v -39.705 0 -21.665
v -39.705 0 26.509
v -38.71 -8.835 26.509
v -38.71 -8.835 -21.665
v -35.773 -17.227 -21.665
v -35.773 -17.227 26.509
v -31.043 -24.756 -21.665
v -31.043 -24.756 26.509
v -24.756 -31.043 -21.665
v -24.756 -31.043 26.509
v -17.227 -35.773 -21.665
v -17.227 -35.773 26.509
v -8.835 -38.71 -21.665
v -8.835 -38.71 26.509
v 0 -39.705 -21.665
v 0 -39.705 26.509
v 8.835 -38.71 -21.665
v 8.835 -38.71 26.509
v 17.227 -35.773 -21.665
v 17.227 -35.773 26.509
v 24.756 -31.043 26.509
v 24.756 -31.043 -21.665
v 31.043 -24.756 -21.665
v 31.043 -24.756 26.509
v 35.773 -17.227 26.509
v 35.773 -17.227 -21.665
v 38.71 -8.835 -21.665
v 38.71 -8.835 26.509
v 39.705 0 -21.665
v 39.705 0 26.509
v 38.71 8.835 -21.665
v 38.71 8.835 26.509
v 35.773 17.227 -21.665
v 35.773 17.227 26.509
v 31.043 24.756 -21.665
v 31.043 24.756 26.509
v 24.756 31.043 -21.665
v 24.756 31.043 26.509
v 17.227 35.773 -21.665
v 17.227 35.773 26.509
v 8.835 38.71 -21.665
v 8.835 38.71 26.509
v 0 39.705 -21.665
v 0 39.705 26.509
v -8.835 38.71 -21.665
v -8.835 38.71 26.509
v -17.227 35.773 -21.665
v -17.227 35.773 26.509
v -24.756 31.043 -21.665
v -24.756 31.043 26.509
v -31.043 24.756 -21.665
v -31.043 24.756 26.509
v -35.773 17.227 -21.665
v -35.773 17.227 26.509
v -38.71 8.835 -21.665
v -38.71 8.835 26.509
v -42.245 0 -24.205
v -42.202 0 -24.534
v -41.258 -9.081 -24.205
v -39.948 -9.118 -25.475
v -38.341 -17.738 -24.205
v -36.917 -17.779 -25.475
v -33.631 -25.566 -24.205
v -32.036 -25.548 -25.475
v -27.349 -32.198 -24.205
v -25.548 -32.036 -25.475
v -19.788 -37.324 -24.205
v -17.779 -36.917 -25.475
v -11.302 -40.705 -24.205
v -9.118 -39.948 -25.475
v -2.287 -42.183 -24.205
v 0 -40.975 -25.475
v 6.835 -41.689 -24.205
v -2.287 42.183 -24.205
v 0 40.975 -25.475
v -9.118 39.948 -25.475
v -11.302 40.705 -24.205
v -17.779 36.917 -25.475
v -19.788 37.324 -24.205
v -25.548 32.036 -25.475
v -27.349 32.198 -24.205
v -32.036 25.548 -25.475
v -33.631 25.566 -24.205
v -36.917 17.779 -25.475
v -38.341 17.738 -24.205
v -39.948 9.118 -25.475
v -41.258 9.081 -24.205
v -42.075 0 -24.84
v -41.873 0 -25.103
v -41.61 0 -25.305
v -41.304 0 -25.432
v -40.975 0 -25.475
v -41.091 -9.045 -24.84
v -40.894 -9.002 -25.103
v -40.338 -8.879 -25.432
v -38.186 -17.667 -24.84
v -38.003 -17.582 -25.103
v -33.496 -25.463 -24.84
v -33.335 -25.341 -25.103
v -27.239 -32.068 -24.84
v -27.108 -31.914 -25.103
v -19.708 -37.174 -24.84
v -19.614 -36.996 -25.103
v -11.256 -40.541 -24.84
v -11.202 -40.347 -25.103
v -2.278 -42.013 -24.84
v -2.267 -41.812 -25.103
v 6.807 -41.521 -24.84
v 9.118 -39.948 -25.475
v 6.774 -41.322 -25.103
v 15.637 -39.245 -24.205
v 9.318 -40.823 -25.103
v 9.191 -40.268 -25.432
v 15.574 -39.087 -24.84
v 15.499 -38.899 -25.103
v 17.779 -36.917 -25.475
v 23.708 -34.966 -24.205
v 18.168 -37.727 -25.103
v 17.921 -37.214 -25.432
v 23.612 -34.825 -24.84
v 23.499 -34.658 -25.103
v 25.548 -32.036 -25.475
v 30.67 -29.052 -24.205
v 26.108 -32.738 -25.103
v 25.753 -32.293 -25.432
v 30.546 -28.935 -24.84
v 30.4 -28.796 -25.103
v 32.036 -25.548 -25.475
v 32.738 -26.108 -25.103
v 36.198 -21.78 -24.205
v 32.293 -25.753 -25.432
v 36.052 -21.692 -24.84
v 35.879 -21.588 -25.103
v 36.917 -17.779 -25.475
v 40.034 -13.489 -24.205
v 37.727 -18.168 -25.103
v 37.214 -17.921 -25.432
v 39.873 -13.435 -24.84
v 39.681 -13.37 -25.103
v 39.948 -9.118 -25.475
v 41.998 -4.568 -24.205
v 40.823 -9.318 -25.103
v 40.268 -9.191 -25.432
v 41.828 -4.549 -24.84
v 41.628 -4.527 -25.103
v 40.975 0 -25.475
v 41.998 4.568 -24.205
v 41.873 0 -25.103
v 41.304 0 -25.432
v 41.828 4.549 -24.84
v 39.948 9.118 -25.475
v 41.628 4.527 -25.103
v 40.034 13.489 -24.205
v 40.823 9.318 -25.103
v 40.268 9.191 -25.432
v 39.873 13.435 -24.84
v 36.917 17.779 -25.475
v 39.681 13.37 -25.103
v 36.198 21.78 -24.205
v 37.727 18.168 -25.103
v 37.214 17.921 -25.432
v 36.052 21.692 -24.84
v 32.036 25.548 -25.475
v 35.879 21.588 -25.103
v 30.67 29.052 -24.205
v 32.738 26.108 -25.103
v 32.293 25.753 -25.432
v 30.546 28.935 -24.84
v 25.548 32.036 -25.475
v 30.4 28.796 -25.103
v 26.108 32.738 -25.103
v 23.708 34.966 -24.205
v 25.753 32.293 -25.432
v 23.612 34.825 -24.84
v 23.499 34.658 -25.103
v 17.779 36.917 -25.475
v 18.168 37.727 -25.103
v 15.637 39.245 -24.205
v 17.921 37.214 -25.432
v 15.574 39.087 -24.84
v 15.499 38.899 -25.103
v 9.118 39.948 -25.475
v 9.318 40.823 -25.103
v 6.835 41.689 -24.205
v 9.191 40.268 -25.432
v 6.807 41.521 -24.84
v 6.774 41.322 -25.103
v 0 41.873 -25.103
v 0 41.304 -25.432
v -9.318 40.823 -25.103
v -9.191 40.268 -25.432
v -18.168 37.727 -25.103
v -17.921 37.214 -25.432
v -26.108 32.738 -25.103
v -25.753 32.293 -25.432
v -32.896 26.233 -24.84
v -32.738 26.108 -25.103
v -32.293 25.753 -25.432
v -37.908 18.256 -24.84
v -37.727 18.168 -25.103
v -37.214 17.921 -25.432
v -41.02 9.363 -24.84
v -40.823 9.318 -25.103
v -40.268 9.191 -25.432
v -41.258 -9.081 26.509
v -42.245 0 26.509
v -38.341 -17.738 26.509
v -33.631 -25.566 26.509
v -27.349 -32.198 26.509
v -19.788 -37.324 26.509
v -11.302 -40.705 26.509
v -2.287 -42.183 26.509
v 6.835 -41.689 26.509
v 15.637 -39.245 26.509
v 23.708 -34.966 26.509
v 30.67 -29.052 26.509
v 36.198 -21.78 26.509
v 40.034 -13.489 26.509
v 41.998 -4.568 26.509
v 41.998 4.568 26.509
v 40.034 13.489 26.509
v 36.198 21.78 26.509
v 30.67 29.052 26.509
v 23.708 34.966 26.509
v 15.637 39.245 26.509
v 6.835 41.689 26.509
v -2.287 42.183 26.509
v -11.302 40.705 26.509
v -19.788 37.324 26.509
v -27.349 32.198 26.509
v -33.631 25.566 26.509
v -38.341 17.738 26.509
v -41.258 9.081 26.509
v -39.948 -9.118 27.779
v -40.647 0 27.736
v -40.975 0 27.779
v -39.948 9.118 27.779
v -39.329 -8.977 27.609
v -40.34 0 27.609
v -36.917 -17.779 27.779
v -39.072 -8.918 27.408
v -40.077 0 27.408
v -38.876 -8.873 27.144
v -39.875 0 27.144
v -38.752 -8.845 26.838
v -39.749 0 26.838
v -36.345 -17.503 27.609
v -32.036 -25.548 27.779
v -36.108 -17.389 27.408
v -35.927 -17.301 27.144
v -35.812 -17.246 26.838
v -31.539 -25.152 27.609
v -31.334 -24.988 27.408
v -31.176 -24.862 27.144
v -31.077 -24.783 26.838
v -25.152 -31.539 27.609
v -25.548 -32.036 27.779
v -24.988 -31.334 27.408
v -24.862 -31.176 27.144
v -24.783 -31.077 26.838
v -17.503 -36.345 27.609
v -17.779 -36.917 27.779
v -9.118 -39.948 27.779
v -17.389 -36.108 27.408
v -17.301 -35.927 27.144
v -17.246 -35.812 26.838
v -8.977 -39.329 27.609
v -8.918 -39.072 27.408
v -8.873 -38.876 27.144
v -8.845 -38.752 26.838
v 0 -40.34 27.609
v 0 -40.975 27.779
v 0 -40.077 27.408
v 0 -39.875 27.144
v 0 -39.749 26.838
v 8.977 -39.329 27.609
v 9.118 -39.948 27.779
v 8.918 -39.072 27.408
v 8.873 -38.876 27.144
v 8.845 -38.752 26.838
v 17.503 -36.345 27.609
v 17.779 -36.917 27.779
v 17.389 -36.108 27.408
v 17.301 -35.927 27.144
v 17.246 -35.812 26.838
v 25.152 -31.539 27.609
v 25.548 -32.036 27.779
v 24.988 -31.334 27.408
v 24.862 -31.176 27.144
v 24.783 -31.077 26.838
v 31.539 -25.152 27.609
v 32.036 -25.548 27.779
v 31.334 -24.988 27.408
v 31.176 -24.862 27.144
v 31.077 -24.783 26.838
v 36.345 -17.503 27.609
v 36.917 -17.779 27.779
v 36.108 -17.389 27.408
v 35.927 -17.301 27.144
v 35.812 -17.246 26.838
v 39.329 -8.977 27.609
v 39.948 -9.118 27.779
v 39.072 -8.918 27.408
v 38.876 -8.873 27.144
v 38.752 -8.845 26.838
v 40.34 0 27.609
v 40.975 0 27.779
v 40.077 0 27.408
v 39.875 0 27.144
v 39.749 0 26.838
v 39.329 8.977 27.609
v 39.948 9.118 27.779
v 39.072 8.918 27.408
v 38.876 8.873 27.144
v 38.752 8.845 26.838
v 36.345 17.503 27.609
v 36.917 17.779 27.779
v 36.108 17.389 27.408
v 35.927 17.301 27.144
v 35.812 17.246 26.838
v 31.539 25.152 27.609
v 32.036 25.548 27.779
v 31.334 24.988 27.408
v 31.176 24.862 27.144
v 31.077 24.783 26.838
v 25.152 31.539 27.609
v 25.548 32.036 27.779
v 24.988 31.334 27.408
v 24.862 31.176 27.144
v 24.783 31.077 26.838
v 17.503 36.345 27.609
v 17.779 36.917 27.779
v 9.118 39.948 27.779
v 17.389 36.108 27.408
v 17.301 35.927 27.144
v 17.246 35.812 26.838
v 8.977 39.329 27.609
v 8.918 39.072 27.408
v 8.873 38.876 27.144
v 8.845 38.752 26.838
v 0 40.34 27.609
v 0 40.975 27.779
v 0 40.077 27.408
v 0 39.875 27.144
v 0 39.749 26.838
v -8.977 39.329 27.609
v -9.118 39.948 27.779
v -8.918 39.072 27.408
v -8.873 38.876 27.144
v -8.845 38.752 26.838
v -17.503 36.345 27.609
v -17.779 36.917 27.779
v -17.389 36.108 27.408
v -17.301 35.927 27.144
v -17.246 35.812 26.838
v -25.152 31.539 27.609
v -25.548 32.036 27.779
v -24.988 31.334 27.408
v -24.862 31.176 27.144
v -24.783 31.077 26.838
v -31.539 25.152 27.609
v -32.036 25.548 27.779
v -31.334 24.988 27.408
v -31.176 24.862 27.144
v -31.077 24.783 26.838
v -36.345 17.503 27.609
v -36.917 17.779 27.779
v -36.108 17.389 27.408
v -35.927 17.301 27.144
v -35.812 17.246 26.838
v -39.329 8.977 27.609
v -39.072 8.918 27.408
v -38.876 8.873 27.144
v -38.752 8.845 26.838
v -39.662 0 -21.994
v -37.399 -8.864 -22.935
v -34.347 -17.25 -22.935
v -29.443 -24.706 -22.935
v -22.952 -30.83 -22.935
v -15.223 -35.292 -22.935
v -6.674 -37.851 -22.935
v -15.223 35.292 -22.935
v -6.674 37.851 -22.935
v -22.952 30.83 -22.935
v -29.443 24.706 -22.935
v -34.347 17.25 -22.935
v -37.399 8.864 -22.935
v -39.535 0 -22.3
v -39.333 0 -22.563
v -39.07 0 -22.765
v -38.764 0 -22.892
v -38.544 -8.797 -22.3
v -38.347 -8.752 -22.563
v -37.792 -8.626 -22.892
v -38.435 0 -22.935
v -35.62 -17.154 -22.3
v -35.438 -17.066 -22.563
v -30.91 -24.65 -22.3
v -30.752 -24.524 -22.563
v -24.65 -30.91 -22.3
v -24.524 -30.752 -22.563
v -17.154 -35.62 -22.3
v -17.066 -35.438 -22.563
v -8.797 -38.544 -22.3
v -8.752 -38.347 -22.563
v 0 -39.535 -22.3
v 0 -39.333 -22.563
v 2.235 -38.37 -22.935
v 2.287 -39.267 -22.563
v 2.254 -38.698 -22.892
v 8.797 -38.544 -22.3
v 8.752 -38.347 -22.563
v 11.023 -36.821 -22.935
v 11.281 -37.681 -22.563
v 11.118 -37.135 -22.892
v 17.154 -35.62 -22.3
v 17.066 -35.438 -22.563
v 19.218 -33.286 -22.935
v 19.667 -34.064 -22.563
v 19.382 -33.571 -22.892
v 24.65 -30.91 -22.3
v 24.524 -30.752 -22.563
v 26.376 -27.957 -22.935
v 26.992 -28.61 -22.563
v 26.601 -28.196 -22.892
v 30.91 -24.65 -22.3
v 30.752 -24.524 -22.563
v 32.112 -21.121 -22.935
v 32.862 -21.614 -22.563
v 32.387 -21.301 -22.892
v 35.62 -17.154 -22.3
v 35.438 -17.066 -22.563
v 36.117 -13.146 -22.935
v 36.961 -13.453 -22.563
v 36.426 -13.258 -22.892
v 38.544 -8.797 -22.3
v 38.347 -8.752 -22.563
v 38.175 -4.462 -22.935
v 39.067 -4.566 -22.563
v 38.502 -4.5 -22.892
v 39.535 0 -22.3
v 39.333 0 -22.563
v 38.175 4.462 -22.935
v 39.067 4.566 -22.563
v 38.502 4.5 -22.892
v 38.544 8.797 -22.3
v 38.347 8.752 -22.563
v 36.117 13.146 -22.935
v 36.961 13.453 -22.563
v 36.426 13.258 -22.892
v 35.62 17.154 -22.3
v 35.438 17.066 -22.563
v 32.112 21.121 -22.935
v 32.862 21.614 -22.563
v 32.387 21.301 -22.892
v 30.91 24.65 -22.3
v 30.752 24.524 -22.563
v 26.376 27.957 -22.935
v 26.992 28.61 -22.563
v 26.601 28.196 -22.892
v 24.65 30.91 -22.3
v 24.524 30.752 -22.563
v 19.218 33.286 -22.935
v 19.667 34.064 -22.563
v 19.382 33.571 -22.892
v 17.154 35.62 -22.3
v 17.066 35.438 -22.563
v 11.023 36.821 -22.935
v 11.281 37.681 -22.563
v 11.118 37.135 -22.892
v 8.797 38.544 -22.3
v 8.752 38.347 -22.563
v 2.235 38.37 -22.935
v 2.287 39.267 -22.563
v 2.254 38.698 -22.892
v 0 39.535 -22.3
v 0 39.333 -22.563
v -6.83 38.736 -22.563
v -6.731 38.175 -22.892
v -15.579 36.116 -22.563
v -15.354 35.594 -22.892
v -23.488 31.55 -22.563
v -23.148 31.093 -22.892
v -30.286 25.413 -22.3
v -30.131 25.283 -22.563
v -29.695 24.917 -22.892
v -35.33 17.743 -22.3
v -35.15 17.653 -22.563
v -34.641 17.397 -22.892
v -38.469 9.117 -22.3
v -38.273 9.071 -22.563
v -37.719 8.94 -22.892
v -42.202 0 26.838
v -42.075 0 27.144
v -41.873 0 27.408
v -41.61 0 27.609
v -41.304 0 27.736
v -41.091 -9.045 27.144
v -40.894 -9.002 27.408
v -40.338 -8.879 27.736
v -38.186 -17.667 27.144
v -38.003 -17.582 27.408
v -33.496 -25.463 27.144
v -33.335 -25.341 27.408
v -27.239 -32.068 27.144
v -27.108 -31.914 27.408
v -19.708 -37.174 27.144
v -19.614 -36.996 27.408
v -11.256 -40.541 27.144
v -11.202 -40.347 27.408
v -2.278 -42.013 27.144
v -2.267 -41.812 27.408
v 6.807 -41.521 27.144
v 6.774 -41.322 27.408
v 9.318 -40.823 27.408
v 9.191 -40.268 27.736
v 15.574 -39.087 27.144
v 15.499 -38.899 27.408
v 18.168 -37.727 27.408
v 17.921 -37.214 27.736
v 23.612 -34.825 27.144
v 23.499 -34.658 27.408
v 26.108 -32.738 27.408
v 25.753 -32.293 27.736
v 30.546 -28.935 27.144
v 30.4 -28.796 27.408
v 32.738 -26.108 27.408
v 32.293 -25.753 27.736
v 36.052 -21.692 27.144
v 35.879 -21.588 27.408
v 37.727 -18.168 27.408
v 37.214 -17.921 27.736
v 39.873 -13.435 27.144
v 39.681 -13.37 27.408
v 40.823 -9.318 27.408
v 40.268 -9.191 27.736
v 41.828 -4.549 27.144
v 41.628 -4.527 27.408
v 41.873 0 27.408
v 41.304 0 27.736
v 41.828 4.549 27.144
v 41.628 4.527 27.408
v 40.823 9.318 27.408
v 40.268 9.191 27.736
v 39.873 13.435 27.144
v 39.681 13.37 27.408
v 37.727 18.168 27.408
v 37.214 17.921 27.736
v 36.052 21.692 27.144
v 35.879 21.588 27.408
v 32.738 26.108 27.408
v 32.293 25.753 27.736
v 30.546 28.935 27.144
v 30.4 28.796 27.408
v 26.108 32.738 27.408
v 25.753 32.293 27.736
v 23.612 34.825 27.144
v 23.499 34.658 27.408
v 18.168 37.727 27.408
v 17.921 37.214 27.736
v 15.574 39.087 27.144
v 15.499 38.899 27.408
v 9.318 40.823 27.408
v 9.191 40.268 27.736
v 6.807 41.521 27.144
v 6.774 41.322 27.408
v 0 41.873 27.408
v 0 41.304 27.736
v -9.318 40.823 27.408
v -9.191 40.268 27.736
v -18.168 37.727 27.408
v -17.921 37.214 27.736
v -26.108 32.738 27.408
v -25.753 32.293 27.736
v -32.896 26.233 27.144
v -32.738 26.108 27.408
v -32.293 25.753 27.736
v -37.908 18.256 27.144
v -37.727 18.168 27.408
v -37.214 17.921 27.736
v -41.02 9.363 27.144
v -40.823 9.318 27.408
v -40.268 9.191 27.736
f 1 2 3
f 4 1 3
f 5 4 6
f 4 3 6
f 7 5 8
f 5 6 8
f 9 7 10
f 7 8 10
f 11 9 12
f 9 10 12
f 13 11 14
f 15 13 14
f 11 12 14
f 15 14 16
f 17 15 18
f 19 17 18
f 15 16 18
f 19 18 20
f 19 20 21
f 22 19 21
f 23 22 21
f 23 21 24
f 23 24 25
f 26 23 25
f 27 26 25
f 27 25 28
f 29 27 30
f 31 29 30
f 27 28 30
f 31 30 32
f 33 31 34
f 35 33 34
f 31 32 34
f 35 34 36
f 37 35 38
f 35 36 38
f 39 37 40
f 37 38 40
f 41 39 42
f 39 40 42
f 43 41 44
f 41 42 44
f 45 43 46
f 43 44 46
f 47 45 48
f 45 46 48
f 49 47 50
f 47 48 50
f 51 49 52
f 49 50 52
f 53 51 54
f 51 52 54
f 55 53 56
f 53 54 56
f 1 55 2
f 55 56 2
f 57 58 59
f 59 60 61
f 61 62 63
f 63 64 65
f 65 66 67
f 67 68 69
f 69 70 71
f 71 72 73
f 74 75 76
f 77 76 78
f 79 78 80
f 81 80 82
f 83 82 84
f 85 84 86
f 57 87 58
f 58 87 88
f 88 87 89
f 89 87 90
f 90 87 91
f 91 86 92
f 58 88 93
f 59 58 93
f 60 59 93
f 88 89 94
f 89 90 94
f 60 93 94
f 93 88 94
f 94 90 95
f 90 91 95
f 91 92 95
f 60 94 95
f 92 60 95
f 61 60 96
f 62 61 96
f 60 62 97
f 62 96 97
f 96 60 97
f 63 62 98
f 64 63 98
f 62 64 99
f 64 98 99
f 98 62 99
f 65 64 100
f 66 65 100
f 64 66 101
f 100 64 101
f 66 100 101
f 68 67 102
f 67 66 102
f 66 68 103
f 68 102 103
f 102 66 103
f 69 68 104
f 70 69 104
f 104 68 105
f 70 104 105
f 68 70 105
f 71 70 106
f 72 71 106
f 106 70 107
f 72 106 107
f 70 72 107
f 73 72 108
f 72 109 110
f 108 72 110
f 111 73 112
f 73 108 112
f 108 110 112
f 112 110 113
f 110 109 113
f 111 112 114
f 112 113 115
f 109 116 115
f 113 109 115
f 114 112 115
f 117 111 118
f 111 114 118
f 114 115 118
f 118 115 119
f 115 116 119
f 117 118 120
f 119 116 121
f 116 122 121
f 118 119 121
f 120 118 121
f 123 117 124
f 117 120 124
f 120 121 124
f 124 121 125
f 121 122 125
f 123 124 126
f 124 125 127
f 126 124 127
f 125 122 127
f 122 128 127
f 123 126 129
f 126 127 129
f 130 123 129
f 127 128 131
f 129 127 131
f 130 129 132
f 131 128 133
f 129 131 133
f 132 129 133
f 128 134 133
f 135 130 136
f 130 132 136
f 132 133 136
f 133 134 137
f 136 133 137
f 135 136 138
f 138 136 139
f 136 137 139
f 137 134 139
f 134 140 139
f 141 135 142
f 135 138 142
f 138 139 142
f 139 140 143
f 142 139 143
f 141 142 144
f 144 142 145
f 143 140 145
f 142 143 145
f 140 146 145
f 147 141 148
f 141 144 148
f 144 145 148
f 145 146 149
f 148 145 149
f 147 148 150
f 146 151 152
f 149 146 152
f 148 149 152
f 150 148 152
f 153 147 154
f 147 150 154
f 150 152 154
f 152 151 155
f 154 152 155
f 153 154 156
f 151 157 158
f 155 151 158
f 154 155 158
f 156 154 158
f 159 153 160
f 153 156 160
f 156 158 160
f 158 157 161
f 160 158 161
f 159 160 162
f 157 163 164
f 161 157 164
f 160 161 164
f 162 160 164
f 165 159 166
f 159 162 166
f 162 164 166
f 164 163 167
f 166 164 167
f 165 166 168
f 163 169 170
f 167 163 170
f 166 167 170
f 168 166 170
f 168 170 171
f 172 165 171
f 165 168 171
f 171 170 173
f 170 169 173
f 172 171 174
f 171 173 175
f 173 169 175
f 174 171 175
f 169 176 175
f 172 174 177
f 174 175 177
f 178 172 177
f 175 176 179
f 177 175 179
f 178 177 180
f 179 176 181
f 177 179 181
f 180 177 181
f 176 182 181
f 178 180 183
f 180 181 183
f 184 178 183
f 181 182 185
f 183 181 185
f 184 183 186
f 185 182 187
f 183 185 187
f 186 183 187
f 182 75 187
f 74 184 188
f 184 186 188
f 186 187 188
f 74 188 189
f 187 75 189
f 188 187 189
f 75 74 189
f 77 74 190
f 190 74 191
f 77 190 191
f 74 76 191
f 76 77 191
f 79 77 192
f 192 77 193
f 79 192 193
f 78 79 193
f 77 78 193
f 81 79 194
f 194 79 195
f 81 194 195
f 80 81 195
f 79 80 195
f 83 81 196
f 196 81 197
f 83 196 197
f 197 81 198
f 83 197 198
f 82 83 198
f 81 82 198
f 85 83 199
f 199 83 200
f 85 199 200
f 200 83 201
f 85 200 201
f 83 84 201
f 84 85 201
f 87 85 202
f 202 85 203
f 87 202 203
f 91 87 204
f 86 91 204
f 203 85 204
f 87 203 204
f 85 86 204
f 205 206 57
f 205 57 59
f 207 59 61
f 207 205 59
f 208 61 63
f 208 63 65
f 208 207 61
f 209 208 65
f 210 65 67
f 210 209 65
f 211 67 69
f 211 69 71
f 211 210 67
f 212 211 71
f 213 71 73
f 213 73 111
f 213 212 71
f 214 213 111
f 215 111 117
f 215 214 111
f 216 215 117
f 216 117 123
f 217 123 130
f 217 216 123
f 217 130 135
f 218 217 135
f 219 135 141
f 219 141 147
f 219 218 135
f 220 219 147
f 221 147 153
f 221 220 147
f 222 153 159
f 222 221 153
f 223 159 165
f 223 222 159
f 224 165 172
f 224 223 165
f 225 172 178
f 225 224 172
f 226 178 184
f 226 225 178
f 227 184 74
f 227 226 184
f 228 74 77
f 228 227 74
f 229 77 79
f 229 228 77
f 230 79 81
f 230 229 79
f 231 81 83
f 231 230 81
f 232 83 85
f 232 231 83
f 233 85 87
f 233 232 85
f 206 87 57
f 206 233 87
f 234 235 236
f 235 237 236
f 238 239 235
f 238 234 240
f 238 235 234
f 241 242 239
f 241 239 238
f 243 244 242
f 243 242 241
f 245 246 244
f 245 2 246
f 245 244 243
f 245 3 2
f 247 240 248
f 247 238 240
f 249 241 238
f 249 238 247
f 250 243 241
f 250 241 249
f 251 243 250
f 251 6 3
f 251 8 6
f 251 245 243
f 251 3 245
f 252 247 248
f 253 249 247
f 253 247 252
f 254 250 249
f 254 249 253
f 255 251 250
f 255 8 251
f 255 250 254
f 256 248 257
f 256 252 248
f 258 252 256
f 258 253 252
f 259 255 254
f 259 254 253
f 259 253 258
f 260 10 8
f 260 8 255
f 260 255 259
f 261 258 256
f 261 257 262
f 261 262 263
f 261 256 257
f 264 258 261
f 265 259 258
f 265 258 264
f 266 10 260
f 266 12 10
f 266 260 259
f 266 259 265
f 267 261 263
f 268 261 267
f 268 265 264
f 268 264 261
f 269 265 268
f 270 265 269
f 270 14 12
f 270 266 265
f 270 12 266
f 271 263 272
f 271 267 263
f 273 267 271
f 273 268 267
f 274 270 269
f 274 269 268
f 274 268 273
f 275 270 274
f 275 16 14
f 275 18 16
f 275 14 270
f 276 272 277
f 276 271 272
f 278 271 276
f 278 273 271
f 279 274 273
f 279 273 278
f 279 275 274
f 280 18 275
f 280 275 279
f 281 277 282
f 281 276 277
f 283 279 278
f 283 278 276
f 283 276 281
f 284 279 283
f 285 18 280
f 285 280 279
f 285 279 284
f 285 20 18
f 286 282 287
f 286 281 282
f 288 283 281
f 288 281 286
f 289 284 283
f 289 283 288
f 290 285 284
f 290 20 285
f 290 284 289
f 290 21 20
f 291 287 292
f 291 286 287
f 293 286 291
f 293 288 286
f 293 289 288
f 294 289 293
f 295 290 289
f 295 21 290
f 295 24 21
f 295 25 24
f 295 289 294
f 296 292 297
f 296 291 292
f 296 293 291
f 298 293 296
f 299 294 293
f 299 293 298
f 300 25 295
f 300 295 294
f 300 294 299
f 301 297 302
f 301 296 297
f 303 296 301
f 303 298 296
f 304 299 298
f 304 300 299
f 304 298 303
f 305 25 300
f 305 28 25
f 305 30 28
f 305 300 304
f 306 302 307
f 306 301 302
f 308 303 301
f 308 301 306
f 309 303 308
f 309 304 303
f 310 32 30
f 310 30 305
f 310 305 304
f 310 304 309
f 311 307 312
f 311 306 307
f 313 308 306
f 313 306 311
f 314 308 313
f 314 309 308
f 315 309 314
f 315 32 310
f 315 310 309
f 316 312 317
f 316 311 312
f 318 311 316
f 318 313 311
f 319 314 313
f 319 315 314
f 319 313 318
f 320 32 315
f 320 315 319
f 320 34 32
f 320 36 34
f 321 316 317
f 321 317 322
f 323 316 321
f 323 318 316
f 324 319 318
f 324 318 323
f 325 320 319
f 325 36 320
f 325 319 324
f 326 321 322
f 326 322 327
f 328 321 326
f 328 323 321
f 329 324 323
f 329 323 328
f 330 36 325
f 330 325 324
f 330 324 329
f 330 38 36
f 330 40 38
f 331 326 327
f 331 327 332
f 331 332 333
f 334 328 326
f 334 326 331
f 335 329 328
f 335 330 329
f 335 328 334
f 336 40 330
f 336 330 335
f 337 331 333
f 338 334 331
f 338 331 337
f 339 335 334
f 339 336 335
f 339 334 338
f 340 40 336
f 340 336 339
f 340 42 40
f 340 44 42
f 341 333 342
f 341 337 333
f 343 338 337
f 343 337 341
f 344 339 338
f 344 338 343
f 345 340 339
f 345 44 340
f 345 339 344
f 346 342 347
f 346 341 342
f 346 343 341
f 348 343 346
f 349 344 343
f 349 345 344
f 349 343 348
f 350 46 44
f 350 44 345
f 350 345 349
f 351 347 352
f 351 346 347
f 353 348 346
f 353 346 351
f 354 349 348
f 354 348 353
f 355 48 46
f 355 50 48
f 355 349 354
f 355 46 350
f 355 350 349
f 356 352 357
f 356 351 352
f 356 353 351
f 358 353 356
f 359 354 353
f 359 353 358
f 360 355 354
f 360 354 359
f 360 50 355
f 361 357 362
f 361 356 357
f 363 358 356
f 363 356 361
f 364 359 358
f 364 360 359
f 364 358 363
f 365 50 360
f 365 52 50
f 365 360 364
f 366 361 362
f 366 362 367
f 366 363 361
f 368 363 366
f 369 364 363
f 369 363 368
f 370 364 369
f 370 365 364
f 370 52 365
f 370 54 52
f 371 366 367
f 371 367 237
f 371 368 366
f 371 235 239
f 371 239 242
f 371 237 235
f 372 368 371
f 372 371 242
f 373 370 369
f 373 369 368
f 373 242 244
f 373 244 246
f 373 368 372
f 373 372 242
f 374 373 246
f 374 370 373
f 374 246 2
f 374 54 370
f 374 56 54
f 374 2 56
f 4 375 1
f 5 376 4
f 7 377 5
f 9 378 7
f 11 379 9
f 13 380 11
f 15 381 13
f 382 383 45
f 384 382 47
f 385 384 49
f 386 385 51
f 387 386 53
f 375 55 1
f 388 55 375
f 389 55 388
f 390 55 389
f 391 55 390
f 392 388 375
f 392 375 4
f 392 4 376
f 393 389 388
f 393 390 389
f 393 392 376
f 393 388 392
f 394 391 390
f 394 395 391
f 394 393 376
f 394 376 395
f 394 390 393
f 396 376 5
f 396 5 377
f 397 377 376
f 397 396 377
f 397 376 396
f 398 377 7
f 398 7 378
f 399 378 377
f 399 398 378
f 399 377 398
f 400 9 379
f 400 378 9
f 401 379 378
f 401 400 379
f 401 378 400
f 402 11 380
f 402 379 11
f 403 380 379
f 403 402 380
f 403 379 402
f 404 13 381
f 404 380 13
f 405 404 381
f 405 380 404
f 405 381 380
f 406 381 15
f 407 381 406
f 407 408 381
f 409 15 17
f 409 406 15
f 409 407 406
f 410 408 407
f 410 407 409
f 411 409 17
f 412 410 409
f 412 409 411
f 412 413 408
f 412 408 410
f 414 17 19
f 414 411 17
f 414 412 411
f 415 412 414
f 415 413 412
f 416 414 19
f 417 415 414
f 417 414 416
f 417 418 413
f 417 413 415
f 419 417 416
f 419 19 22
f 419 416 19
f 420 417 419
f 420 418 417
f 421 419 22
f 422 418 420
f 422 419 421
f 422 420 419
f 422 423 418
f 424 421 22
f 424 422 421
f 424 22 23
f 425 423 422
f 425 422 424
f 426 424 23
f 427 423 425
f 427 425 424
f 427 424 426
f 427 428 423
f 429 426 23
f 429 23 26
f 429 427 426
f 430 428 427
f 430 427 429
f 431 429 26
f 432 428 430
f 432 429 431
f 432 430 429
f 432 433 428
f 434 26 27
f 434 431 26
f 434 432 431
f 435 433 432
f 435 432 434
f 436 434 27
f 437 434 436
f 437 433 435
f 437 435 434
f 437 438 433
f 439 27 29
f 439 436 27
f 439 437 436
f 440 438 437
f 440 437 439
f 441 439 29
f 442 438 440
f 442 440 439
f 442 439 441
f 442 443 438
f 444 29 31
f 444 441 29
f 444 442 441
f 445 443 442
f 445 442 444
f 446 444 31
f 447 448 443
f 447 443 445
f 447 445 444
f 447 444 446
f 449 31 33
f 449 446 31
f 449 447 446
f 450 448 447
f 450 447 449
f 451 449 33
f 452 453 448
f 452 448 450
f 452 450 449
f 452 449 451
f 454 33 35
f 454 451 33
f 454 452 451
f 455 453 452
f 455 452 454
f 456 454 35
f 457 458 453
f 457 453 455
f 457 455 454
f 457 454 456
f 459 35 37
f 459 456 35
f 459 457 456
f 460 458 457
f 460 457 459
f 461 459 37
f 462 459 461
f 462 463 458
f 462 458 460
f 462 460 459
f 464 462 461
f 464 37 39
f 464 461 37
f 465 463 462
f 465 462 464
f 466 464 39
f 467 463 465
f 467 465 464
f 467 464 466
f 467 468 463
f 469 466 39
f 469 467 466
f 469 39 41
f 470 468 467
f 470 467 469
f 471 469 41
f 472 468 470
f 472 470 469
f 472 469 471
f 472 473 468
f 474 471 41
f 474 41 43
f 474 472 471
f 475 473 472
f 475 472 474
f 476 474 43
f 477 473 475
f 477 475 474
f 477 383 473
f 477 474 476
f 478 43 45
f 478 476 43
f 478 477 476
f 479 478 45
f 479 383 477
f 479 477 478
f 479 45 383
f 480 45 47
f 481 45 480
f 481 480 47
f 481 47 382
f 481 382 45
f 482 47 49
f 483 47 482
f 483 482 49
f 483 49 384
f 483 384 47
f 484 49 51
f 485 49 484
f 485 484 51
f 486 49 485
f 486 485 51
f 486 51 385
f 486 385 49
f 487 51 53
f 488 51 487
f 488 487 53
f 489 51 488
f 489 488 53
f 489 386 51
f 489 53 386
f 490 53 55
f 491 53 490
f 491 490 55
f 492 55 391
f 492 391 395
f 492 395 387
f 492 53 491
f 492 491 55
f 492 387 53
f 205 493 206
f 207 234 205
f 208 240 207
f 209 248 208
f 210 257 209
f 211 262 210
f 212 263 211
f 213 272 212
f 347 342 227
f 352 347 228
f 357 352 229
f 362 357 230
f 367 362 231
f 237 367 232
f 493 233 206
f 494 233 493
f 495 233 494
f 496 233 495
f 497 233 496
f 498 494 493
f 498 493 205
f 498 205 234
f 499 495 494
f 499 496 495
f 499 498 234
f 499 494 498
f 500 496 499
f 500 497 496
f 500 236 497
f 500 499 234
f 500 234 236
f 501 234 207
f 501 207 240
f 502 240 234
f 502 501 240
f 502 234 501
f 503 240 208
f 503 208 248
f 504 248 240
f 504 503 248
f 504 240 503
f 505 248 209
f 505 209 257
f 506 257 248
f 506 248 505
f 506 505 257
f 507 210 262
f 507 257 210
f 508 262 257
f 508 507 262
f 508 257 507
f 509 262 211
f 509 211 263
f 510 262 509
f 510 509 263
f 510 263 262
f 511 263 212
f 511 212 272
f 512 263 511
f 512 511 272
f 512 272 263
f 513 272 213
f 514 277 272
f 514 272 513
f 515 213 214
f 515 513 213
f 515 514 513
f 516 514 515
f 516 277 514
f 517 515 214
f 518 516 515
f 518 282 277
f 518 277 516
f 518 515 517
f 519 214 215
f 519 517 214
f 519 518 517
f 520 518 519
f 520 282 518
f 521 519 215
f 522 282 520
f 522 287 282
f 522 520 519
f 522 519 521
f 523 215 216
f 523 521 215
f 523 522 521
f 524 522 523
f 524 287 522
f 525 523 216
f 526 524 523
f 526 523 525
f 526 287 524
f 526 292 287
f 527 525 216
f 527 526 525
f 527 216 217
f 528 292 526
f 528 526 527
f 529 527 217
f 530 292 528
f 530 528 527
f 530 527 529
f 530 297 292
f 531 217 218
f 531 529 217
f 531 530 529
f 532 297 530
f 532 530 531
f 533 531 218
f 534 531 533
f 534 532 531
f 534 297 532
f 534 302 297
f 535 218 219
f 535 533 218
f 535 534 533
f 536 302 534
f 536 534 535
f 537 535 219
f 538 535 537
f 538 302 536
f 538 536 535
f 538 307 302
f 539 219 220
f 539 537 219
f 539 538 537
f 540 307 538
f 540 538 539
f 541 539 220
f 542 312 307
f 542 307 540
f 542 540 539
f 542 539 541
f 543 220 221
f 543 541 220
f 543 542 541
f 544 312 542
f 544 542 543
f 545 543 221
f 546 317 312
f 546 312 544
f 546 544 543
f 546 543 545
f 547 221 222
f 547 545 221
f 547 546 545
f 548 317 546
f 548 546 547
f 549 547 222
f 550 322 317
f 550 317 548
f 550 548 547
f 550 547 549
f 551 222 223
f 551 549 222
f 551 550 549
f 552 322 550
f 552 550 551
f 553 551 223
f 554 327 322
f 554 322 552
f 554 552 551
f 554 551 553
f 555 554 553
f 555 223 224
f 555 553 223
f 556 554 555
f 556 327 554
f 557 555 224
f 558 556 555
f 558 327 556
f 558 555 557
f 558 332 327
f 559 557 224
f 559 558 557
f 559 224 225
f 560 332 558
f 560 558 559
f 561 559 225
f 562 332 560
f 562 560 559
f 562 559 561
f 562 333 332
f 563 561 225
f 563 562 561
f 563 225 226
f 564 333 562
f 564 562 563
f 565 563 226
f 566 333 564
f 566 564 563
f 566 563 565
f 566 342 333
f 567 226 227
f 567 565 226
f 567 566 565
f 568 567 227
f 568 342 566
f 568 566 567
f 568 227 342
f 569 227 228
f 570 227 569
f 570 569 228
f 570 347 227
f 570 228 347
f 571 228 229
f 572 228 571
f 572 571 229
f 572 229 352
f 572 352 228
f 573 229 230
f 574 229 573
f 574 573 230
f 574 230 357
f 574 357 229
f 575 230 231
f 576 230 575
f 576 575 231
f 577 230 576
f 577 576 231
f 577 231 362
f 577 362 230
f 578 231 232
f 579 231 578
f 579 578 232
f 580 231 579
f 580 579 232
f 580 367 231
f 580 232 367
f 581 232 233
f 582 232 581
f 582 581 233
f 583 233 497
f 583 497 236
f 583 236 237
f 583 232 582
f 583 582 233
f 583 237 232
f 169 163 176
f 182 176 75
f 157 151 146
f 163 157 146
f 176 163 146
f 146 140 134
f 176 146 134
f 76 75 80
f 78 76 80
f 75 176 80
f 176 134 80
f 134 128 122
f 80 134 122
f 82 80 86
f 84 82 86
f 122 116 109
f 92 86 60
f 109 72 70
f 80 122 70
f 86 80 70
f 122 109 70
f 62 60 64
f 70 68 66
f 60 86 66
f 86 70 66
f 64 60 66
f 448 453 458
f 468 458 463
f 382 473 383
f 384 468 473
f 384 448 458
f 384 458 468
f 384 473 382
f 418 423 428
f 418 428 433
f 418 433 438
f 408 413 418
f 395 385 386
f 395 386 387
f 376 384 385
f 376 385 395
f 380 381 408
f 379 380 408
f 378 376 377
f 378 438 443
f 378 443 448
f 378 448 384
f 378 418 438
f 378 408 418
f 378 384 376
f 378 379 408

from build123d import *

# Parameters (mm, degrees)
F0_W = 42.2452799976
F0_H = 53.2546564937
F2_T = -2.54
F3_R = 1.26999
F4_R = 1.27


# Not quite as in the source:
# - a fillet or chamfer is up to 0.001 mm smaller than in the source, because OpenCascade refuses the exact size


with BuildPart() as f1:
    # F0 (on Front) → F1 (revolve)
    with BuildSketch(Plane.XZ):
        with Locations((-21.1226399988, 1.152144745)):
            Rectangle(F0_W, F0_H)
    revolve(axis=Axis((0, 0, 1.152144745), (0, 0, 1)))

    # F2
    f2_openings = [f1.faces().sort_by_distance(p)[0] for p in [
        (0, 0, 27.779473),
    ]]
    offset(amount=F2_T, openings=f2_openings)

    # F3 (radius 1.27 in the source; OpenCascade refuses exactly that, so slightly less here)
    f3_edges = [f1.edges().sort_by_distance(p)[0] for p in [
        (39.70528, 0, 27.779473),
        (42.24528, 0, 27.779473),
    ]]
    fillet(f3_edges, radius=F3_R)

    # F4
    f4_edges = [f1.edges().sort_by_distance(p)[0] for p in [
        (39.70528, 0, -22.935184),
        (42.24528, 0, -25.475184),
    ]]
    fillet(f4_edges, radius=F4_R)


solid = f1.part
